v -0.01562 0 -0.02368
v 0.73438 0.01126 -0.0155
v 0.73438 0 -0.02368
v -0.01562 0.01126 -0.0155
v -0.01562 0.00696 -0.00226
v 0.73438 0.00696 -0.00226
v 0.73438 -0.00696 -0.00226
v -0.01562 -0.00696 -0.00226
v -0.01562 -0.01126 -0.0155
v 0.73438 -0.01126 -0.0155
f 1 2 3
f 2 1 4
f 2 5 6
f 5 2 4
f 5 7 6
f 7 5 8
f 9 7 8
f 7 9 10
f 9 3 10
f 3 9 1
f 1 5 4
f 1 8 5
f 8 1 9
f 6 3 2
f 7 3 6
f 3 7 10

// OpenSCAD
translate([-0.015625, 0, 0])
rotate([0, 90, 0])
translate([0.011842105263157895, 0, 0])
cylinder(h=0.75, r=0.011842105263157895, center=false);
